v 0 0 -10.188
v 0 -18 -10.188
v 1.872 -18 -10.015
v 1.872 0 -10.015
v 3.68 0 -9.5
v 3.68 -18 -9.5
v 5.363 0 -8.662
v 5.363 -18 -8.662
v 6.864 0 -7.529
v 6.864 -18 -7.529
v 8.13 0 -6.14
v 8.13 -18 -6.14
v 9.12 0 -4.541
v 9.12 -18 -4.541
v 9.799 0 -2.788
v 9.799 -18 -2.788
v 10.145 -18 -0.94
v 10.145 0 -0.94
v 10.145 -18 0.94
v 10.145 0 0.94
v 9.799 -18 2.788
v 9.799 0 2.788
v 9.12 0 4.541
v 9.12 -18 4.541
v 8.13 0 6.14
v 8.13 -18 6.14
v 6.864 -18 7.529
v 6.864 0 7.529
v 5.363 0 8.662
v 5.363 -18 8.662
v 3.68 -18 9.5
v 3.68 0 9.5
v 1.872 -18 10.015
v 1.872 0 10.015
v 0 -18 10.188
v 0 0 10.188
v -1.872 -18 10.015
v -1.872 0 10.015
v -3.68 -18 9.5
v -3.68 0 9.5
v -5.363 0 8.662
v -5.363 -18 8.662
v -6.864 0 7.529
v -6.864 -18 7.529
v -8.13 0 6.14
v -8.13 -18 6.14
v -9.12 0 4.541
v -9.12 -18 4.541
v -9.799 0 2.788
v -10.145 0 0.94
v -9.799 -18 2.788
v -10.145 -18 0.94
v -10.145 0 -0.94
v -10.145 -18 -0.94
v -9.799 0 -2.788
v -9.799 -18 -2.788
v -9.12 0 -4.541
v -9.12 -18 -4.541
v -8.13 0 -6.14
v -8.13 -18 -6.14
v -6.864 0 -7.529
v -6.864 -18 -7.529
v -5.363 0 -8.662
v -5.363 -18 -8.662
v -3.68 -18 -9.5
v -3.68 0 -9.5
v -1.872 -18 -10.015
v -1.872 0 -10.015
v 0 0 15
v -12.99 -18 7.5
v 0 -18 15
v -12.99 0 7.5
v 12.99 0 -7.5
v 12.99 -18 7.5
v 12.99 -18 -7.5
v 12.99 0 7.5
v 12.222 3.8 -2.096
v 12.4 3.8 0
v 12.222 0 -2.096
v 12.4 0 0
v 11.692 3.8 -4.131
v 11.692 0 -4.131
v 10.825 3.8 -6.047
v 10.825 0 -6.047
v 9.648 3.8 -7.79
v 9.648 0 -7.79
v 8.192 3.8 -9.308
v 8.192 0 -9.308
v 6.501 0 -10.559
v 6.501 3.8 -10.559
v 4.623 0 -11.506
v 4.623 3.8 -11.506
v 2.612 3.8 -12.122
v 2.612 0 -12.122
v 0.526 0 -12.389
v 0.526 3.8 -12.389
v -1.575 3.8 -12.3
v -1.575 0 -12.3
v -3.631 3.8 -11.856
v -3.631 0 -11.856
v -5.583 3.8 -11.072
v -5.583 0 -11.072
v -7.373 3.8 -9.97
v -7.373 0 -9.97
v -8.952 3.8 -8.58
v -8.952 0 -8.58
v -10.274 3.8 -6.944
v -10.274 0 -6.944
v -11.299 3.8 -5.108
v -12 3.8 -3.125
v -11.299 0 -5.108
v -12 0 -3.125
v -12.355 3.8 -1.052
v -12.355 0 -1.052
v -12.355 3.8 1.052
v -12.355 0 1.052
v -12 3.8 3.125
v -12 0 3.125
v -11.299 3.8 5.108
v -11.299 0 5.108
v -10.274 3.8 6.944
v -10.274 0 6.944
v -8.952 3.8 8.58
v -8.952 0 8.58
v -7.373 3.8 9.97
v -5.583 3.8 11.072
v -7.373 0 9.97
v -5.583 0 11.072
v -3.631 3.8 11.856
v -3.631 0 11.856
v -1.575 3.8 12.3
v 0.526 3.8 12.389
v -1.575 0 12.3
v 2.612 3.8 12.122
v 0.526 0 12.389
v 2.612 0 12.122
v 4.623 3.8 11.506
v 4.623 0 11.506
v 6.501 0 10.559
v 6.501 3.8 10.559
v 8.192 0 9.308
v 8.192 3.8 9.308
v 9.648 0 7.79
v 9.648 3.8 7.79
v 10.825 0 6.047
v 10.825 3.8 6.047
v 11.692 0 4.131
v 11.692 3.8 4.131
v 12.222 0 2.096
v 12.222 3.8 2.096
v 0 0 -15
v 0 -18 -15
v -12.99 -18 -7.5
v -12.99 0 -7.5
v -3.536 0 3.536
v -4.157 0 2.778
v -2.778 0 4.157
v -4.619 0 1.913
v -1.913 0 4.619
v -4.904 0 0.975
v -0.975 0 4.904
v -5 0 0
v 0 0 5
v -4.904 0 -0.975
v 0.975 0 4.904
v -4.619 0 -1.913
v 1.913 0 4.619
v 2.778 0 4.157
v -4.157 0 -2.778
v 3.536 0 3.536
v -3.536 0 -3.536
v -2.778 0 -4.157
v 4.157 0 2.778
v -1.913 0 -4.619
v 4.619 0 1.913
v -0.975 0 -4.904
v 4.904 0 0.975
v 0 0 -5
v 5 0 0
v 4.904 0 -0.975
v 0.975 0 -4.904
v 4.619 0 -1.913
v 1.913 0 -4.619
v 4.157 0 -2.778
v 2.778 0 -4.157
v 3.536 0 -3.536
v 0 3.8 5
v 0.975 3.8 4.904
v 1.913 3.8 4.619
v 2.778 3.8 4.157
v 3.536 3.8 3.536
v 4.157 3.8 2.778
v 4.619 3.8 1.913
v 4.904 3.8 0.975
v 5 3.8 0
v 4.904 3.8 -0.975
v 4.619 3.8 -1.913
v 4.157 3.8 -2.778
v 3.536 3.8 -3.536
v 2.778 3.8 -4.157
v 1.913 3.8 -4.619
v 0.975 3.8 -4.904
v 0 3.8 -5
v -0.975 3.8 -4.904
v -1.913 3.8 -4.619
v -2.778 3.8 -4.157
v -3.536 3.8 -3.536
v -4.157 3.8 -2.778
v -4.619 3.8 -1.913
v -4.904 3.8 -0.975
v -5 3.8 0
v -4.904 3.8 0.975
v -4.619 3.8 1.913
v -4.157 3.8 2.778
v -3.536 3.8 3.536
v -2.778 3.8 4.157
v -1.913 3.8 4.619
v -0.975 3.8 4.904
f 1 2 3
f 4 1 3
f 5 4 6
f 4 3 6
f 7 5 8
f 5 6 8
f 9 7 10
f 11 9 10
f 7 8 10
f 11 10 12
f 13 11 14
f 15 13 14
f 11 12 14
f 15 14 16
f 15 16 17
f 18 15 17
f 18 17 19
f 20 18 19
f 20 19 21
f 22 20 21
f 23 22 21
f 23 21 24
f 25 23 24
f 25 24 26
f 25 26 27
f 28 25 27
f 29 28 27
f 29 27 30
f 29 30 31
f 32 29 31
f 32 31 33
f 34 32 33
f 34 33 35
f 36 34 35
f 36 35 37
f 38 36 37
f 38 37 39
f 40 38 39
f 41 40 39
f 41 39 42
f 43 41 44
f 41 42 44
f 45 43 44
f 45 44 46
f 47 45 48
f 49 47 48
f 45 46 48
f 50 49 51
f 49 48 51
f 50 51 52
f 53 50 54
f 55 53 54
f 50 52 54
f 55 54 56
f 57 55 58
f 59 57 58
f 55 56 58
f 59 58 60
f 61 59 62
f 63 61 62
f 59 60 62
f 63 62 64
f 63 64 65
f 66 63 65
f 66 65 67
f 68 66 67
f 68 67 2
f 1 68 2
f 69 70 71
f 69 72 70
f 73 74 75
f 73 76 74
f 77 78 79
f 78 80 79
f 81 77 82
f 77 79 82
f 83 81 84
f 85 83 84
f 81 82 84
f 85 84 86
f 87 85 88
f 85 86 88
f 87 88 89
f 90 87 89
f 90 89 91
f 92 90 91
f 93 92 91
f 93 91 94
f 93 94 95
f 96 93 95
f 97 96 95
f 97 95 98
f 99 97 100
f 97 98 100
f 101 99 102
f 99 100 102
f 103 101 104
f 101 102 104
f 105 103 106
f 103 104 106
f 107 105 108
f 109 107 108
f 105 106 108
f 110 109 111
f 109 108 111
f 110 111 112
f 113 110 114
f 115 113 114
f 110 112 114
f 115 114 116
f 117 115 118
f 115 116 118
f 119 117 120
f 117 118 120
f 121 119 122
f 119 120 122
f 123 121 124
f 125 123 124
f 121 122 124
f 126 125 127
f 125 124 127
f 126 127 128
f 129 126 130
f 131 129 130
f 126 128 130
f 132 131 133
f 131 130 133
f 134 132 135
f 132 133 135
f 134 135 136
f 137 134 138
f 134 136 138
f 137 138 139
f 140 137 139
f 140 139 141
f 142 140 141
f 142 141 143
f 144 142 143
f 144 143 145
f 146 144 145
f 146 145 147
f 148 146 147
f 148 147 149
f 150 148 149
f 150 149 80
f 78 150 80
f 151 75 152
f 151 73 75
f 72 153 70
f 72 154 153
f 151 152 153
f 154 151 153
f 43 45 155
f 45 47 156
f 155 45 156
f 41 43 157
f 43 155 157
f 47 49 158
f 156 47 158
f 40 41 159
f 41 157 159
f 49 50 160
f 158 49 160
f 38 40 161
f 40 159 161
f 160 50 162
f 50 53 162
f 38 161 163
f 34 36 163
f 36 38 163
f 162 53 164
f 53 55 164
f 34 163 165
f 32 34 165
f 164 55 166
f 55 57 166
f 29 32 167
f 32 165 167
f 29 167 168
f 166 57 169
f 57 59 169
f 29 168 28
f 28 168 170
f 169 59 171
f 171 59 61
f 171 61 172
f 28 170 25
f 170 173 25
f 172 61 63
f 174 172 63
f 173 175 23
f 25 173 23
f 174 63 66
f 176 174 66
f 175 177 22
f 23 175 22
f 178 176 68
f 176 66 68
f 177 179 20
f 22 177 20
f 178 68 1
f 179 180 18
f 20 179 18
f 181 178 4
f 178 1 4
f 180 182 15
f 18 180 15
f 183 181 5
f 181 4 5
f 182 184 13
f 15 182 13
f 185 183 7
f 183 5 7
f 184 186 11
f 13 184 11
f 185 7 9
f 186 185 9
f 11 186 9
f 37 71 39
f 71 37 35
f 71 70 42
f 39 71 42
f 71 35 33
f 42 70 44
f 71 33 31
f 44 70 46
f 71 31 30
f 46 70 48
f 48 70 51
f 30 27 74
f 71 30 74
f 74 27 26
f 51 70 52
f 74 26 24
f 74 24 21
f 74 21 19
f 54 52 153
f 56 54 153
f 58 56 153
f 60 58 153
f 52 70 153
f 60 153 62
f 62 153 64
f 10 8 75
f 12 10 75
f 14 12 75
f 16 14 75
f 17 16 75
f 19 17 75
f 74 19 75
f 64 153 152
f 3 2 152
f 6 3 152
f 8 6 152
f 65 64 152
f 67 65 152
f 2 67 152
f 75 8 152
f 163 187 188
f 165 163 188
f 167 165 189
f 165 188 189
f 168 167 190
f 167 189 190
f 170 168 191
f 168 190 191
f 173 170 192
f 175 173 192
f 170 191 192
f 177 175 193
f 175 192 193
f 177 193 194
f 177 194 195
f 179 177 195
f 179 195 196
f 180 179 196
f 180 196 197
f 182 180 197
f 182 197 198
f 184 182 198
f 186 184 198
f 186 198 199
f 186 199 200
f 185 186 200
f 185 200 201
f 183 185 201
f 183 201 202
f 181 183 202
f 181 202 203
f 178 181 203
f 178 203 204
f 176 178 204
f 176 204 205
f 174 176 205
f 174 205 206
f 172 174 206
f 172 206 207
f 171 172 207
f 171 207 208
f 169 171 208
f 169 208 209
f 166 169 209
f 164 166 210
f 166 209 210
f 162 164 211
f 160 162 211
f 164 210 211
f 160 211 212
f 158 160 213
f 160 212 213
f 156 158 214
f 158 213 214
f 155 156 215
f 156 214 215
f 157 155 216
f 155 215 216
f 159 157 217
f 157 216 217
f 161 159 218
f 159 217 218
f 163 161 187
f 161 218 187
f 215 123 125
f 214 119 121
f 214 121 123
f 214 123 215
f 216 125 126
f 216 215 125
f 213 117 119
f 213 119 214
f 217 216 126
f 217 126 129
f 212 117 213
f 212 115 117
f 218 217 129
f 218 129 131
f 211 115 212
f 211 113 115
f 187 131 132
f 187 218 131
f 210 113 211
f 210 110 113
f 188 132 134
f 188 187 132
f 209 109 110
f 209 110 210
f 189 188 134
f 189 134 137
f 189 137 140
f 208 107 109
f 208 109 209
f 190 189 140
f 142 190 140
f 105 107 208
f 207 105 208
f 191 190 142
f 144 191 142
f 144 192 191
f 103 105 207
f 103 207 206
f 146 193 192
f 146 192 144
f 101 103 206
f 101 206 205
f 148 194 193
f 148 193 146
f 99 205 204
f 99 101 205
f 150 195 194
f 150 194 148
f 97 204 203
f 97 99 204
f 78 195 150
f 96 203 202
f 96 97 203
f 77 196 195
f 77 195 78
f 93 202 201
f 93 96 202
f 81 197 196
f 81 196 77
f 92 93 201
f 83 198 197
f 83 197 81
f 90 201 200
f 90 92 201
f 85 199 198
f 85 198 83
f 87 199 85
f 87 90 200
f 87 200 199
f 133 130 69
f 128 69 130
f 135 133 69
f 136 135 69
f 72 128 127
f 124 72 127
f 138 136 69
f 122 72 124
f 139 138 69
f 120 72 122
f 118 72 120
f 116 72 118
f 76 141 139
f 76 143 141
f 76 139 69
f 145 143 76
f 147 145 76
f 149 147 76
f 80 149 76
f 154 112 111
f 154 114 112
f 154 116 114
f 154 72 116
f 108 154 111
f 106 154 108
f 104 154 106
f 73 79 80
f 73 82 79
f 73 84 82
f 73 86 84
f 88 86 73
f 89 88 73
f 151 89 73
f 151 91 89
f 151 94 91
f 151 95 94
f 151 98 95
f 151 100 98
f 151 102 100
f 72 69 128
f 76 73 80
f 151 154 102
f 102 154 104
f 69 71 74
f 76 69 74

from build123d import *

# Parameters (mm, degrees)
SKETCH_3_R          = 10.188
CUT_EXTRUDE_1_DEPTH = 27.790856821
SKETCH_5_R          = 12.4
SKETCH_4_R          = 12.4
SKETCH_6_R          = 5
CUT_EXTRUDE_2_DEPTH = 30.478636501


with BuildPart() as part:
    # Эскиз2 → По сечениям1 section 0
    with BuildSketch(Plane(origin=(0, -18, 0), x_dir=(1, 0, 0), z_dir=(0, 1, 0))):
        with BuildLine():
            Line((-12.990381057, -7.5), (0, -15))
            Line((0, -15), (12.990381057, -7.5))
            Line((12.990381057, -7.5), (12.990381057, 7.5))
            Line((12.990381057, 7.5), (0, 15))
            Line((0, 15), (-12.990381057, 7.5))
            Line((-12.990381057, 7.5), (-12.990381057, -7.5))
        make_face()
    # Эскиз1 → По сечениям1 section 1
    with BuildSketch(Plane(origin=(0, 0, 0), x_dir=(1, 0, 0), z_dir=(0, 1, 0))):
        with BuildLine():
            Line((0, 15), (-12.990381057, 7.5))
            Line((-12.990381057, 7.5), (-12.990381057, -7.5))
            Line((-12.990381057, -7.5), (0, -15))
            Line((0, -15), (12.990381057, -7.5))
            Line((12.990381057, -7.5), (12.990381057, 7.5))
            Line((12.990381057, 7.5), (0, 15))
        make_face()
    loft()

    # Эскиз3 → Вырез-Вытянуть1 (cut, through all)
    with BuildSketch(Plane.XZ.offset(18)):
        with Locations(Location((0, 0, 0), (0, 0, 270))):
            Circle(SKETCH_3_R)
    extrude(amount=-CUT_EXTRUDE_1_DEPTH, mode=Mode.SUBTRACT)

    # Эскиз5 → По сечениям2 section 0
    with BuildSketch(Plane(origin=(0, 3.8, 0), x_dir=(1, 0, 0), z_dir=(0, 1, 0))):
        Circle(SKETCH_5_R)
    # Эскиз4 → По сечениям2 section 1
    with BuildSketch(Plane(origin=(0, 0, 0), x_dir=(1, 0, 0), z_dir=(0, 1, 0))):
        Circle(SKETCH_4_R)
    loft()

    # Эскиз6 → Вырез-Вытянуть2 (cut, through all)
    with BuildSketch(Plane(origin=(0, 3.8, 0), x_dir=(1, 0, 0), z_dir=(0, 1, 0))):
        with Locations(Location((0, 0, 0), (0, 0, 270))):
            Circle(SKETCH_6_R)
    extrude(amount=-CUT_EXTRUDE_2_DEPTH, mode=Mode.SUBTRACT)


solid = part.part
